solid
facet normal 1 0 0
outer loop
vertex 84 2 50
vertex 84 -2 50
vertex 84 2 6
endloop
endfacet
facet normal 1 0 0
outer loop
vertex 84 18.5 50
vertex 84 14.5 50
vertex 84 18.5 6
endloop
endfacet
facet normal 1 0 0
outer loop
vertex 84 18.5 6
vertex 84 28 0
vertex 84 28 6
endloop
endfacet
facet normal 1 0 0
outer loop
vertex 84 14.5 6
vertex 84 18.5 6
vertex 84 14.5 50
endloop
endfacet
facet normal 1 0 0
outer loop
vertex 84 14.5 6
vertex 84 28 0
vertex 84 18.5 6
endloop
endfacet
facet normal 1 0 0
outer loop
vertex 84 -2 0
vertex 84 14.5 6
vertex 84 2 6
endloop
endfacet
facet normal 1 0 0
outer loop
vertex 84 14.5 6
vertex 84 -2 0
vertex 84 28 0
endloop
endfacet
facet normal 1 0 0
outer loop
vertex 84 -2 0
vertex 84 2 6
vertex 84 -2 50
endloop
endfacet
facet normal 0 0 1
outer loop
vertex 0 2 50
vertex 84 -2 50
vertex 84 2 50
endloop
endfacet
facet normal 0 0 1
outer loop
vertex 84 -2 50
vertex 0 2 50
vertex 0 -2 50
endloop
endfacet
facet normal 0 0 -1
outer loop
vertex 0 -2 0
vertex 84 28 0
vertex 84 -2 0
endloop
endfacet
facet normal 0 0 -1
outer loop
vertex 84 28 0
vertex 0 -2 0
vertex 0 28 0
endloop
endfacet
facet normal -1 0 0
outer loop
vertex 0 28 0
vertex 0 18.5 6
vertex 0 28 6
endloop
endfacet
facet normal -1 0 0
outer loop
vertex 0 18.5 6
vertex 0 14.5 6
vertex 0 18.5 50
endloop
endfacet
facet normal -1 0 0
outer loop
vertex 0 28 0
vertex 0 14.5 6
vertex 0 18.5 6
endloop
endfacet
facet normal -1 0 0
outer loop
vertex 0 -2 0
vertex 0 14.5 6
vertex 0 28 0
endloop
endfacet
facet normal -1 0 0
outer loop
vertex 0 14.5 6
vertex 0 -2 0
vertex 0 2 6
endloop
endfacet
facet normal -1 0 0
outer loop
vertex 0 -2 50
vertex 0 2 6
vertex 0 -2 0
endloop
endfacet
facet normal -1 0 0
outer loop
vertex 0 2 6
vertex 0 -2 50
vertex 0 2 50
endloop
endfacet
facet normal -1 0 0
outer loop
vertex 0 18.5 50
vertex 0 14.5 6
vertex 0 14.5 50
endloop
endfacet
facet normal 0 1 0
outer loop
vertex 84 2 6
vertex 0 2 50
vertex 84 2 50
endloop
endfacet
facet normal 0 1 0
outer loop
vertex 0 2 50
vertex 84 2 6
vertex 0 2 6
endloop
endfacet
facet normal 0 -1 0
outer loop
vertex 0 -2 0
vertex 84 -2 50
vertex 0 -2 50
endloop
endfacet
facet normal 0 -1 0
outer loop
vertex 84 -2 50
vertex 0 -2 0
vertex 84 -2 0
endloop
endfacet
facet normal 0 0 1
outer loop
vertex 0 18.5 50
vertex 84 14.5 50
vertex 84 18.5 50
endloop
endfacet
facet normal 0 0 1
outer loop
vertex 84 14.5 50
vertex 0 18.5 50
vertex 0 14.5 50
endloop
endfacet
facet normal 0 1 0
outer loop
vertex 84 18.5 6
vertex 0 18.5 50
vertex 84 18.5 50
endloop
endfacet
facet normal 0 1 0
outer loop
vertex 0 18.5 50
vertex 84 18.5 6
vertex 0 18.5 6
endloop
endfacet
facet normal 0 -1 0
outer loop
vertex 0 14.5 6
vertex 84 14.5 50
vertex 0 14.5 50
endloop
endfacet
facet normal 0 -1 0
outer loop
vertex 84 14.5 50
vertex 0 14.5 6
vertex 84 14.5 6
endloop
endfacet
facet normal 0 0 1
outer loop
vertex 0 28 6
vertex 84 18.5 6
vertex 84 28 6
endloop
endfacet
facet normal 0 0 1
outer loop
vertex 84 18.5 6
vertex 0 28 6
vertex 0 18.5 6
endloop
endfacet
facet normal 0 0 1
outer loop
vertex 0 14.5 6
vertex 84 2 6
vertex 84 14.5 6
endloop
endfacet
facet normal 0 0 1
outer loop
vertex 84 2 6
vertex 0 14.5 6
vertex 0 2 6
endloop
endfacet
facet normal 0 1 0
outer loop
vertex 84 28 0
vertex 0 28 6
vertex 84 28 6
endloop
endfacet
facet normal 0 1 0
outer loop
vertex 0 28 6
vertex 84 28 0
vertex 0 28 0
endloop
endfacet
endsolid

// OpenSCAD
// PCR Strip Holder for Ice Bucket

// --- Dimensions ---
wall_thickness = 12;      // Thickness of the ice bucket wall (mm)
strip_length = 84;        // Length of the holder along X (mm)
inner_leg_width = 4;      // Width of the inner leg (Y dimension, mm)
outer_leg_width = 4;      // Width of the outer leg (Y dimension, mm)
total_height = 50;        // Main height of the hook structure (mm)
bridge_start_z = 46;      // Z start for the bridge connection (mm)
bridge_end_z = 50;        // Z end for the bridge connection (mm)
gap_for_wall = 12.5;      // Required gap size in Y to fit over the wall (mm)

ledge_thickness = 6;      // Thickness of the bottom ledge (Z dimension, mm)
ledge_length_y = 30;      // Length of the ledge extending into the ice bucket (-Y direction)
tube_diameter = 6.4;      // Diameter of the PCR tubes (mm)
hole_spacing_x = 9;       // Distance between tube centers along X (mm)
num_tubes = 8;            // Number of tubes to hold

// --- Constants ---
$fn = 100; // High resolution for curves

/*
The error "WARNING: Ignoring 3D child object for 2D operation" occurs because linear_extrude expects a 2D profile (defined in XY or YZ) and extrudes it along the third axis.
Since the part is defined as a profile in YZ, we must use linear_extrude(height=strip_length) to extrude this YZ shape along the X-axis.

The previous code attempted to define 3D shapes inside the linear_extrude block, which caused the error. We must define all components as 2D profiles in YZ and then union/difference them before extrusion.
*/

module yz_profile() {
    // This module defines the cross-section shape in the YZ plane (a single slice along X=0).
    // The final part will be created by extruding this profile 84mm along X.

    difference() {
        // --- Base Solid Shape (Union of all components) ---
        union() {
            // 1. Inner Leg Profile (YZ cross section)
            translate([0, -(inner_leg_width/2), 0])
            cube([1, inner_leg_width, total_height]);

            // 2. Outer Leg Profile (YZ cross section) - Positioned relative to the center line of the hook structure
            // The gap is 12.5mm. Inner leg ends at Y = inner_leg_width/2. Outer leg starts after this + gap.
            translate([0, inner_leg_width + gap_for_wall - (outer_leg_width/2), 0])
            cube([1, outer_leg_width, total_height]);

            // 3. Bridge connecting the legs (YZ cross section)
            // The bridge spans the distance between the inner leg's edge and the outer leg's edge.
            translate([0, inner_leg_width + gap_for_wall - (outer_leg_width/2), bridge_start_z])
            cube([1, outer_leg_width - inner_leg_width, bridge_end_z - bridge_start_z]);

            // 4. Ledge Profile (YZ cross section) - Attached to the foot of the inner leg (Y=0)
            translate([0, -(inner_leg_width/2), 0])
            cube([1, ledge_length_y, ledge_thickness]);
        }

        // --- Tube Holes Cutout Profiles ---
        for (i = [0 : num_tubes - 1]) {
            // Calculate X position for the center of the hole relative to the profile's origin (X=0)
            // Since we are extruding along X, these holes must be cut out from the YZ profile at specific X locations.
            // This requires a more complex approach than simple linear_extrude if the cuts are not centered on the extrusion axis.

            // Re-evaluating: If the part is extruded 84mm along X, all features (like holes) must be defined in the YZ plane and then cut out of the resulting solid block.
            // We cannot use linear_extrude(height=strip_length) if we need cuts at specific X locations *within* that extrusion length.

            // Solution: Model the entire 3D shape directly using union/difference, rather than relying on linear_extrude for the main body.
        }
    }
}


// --- Final Assembly (Modeling in 3D space directly) ---

module pcr_holder_3d() {
    // Define the base solid structure first (The U-shape + Bridge + Ledge)
    union() {
        // 1. Inner Leg (Solid part)
        translate([0, -(inner_leg_width/2), 0])
        cube([strip_length, inner_leg_width, total_height]);

        // 2. Outer Leg (Solid part)
        // Positioned such that the gap is 12.5mm. Inner leg ends at Y = inner_leg_width/2. Outer leg starts after this + gap.
        translate([0, inner_leg_width + gap_for_wall - (outer_leg_width/2), 0])
        cube([strip_length, outer_leg_width, total_height]);

        // 3. Bridge connecting the legs (Solid part)
        // The bridge spans the distance between the inner leg's edge and the outer leg's edge.
        translate([0, inner_leg_width + gap_for_wall - (outer_leg_width/2), bridge_start_z])
        cube([strip_length, outer_leg_width - inner_leg_width, bridge_end_z - bridge_start_z]);

        // 4. Ledge (Solid part) - Attached to the foot of the inner leg (Y=0)
        translate([0, -(inner_leg_width/2), 0])
        cube([strip_length, ledge_length_y, ledge_thickness]);
    }
}

module pcr_holder() {
    difference() {
        // Start with the solid structure
        pcr_holder_3d();

        // Cut out the tube holes
        for (i = [0 : num_tubes - 1]) {
            // Calculate X position for the center of the hole. Centered on X=0, spanning strip_length.
            // The centers are spaced by 9mm, starting from a point that keeps them centered overall.
            // Total span needed: (num_tubes - 1) * hole_spacing_x = 7 * 9 = 63 mm.
            // To center this on X=0, the start should be at -31.5mm and end at +31.5mm.
            start_offset = -( (num_tubes - 1) * hole_spacing_x / 2 );
            x_pos = start_offset + (i * hole_spacing_x);

            // The holes are in the ledge, centered at Y = -15.
            y_center = -15;

            translate([x_pos, y_center, 0]) {
                // Cut a cylinder through the entire thickness of the ledge (ledge_thickness) and slightly beyond for safety.
                cylinder(h = ledge_thickness + 2, r = tube_diameter / 2);
            }
        }
    }
}

// Render the final part
pcr_holder();
